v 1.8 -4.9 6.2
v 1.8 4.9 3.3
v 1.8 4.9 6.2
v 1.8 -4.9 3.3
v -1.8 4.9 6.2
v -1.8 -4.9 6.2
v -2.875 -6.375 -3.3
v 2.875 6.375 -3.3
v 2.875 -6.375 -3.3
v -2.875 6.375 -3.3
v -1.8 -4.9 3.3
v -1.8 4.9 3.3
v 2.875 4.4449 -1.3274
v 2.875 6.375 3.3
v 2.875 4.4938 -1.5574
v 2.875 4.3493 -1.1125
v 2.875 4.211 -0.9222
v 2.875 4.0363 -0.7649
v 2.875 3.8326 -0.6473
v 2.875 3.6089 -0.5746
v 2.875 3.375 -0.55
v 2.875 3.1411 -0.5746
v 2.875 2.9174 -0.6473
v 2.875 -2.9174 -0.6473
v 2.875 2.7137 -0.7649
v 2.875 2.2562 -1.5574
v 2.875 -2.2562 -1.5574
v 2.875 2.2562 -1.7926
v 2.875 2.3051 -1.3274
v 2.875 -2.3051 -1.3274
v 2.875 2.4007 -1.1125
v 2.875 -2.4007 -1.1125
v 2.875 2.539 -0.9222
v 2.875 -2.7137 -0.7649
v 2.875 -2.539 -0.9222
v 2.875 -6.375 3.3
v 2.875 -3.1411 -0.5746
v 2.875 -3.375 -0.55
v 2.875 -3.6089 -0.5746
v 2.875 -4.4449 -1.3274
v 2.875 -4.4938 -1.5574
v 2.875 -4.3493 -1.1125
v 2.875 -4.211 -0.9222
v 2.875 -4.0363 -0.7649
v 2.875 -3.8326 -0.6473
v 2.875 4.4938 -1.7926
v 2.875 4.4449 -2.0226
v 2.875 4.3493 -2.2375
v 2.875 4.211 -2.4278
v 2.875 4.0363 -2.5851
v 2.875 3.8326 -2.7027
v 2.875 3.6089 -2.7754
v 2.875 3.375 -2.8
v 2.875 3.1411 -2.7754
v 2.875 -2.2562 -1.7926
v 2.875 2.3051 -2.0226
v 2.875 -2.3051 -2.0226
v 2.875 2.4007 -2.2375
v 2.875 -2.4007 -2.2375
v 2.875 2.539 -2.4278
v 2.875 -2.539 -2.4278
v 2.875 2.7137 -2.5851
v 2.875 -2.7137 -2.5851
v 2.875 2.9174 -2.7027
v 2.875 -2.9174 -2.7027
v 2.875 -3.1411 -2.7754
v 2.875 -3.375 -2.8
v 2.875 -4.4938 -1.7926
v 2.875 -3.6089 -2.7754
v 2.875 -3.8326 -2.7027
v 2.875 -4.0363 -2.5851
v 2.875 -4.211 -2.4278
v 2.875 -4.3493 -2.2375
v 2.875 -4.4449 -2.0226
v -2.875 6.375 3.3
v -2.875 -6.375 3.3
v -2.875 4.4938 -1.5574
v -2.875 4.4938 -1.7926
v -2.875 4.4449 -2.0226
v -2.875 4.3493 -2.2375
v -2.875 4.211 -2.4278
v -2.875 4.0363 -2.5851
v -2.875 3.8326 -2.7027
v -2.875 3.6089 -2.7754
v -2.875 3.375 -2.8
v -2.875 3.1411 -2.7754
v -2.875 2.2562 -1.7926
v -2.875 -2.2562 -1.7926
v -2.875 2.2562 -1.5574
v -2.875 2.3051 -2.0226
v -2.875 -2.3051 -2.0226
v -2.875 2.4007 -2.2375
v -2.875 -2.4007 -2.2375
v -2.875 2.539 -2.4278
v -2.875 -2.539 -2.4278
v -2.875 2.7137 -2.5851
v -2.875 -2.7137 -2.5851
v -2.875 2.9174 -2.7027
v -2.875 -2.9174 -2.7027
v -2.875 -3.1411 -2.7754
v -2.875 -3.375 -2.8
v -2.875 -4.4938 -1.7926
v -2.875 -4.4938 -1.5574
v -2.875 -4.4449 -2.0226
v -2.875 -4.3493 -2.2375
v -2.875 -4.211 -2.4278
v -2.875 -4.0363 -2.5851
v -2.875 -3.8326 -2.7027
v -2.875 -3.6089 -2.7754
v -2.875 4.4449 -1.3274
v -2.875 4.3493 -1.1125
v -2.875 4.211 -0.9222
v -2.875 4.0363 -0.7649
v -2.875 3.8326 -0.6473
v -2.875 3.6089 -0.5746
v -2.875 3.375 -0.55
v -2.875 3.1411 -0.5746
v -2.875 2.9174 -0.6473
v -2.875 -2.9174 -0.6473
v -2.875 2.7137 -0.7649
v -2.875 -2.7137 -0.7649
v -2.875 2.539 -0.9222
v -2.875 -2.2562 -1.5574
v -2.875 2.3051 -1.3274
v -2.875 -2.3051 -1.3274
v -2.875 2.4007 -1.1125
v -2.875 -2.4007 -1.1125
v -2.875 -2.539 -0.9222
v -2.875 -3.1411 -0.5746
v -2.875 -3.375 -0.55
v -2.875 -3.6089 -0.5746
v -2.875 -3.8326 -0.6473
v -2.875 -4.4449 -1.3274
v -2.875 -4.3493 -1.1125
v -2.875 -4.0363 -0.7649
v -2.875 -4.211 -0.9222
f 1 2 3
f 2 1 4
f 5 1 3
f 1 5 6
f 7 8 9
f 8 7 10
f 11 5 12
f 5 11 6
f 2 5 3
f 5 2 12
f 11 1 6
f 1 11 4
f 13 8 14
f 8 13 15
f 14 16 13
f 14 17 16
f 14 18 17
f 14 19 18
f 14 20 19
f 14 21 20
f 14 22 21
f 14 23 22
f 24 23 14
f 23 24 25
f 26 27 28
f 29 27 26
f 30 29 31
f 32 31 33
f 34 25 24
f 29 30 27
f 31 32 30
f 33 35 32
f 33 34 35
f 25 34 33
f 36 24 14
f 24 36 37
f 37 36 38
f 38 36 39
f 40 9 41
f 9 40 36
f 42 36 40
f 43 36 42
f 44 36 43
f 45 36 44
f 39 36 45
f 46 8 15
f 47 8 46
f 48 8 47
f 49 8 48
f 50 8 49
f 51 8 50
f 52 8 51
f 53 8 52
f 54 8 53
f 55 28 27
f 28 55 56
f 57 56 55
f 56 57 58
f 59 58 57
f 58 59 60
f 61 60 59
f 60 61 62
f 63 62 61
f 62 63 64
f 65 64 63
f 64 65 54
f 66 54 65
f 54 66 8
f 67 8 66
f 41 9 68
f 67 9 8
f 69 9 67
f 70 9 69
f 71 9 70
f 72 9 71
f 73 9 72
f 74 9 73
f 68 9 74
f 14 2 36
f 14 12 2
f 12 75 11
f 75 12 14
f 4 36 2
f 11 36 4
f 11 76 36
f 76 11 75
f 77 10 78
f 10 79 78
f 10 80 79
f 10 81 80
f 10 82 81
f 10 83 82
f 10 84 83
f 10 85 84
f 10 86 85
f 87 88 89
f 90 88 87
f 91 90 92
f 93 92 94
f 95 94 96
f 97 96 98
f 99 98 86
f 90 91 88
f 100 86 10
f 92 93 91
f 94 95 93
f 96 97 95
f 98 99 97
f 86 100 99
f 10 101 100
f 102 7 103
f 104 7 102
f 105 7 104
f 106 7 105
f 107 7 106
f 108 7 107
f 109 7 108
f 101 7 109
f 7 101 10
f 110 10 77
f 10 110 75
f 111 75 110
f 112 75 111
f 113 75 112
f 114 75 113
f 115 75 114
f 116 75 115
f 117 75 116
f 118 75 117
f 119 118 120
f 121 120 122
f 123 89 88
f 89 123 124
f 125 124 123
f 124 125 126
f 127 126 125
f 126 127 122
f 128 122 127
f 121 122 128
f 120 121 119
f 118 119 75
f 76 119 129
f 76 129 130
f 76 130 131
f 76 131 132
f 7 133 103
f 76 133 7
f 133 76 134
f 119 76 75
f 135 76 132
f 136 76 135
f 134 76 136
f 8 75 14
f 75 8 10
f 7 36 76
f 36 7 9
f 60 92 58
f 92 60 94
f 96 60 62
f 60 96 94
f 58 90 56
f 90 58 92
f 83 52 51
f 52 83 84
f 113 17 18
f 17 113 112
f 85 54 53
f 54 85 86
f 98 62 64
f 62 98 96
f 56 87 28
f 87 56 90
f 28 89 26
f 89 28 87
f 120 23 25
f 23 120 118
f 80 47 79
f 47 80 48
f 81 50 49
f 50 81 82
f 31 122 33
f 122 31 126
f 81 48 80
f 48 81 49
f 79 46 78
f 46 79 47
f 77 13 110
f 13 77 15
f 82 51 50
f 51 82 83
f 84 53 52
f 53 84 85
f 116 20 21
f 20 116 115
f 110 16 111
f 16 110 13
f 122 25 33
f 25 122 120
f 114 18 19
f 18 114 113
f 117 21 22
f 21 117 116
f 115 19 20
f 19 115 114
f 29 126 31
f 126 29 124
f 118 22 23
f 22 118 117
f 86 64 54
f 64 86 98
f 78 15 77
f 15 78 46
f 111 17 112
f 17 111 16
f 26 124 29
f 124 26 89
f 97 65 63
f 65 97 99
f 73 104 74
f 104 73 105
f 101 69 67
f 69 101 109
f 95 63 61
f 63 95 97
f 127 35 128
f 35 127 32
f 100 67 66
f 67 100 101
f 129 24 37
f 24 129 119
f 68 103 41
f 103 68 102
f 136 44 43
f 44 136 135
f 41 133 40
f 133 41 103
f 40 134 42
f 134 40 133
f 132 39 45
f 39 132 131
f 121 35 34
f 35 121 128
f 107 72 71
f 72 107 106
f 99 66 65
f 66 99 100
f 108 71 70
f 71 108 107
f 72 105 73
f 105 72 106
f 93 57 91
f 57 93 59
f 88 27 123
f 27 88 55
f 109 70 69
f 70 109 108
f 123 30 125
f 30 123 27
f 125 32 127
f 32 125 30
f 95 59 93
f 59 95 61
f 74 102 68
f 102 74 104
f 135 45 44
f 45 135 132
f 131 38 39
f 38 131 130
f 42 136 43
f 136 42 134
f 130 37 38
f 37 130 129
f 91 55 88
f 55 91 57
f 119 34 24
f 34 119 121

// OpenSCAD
// file: ../settings.scad
// Common settings used by all scad files.

// ALL UNITS IN MILLIMETERS (MM)!!!

$fn = 30;//low-res but fast to render
//$fn = 50;//higher-res but slow to render

pi = 3.1415926535897932384626433832795;

max_footprint = 150; // 15x15 cm

bottom_clearance = 10;
bottom_clearance = 25.4/2+10;
//bottom_clearance = 30;

shell_alpha = 0.215;
//shell_alpha = 1.0;

tolerance = 0.5;

// Flat countersunk M2.5mm x 0.45mm machine screw.
screw_thread_diameter = 2.5;//2.8;//2.75;//2.4?
screw_thread_length = 5;//?
screw_head_diameter = 4.75; // M2.5
//screw_head_diameter = 5.2; // M3
screw_head_height = 1.5;//2;

screw_thread_diameter2 = 2;

unit_thickness = 5;
u = unit_thickness;

shell_thickness = unit_thickness;

// Show flags.
show_platform = 0;
show_head = 1;
show_head_shell = 0;
show_head_electronics_bb = 0;
show_battery = 1;
show_foot_cube = 0;
show_torso = 0;
show_motor = 0;
show_motor_plates = 1;
show_motor_inner_plates = 1;
show_motor_outer_plates = 1;
show_wheel = 0;//obsolete
show_tracks = 1;//
show_track_wheels = 1;
show_caster = 0;
show_rpi = 1;
show_vertical_plates = 1;//
show_horizontal_plates = 1;//
show_caster_plates = 0;//obsolete?
show_camera = 1;
show_screen = 0;
show_edge_mount = 1;
show_sonar_mount = 1;
show_recharge_mount = 1;
show_conduit = 1;
show_torso_shell = 1;
show_recharge_dock = 0;
show_head_tilt_axis = 0;
show_rpi_camera_axis = 0;
show_laser_axis = 0;

head_vertical_angle_tilt = 0;
//head_vertical_angle_tilt = 30;//max
//head_vertical_angle_tilt = 10;

torso_height = 120+20;

base_plate_diameter = max_footprint-unit_thickness*2;
base_plate_frame = 0;

head_height = 50;
head_offset_z = max_footprint/2;
head_middle_cutout = 85;

rpi_with_four_hats_and_clearance = 76;

qrd1114_w = 6.10;
qrd1114_l = 4.39;
qrd1114_h = 4.65;

dock_radius = 10;
dock_gripper_border = 2;
dock_gripper_instep = 0.9;
dock_gripper_cutout_tapper = 50;
dock_receiver_height = 5;

// Patriod Fuel+ 9000 mAh
battery_length = 90;
battery_width = 57;
battery_height = 23;
battery_offset_z = 30;//4;

wheel_diameter = 50;
wheel_offset_x = 65;
wheel_offset_z = wheel_diameter/2;
wheel_axle_diameter = 5;

//caster_diameter = 19.05; // 0.75 inches
caster_diameter = 25.45; // 1 inches
//caster_diameter = 15.875; // 5/8 inches
caster_holder_diameter = 30;//31;
caster_offset_y = base_plate_diameter/2 - caster_holder_diameter/2;

arduino_offset_x = 0;
arduino_offset_y = 0;
arduino_offset_z = 67;
arduino_offset_x2 = 0;
arduino_offset_y2 = -20;
arduino_offset_z2 = torso_height+bottom_clearance;

horizontal_plate_width = unit_thickness*8*2 - unit_thickness*2;
horizontal_plate_depth = unit_thickness*8*2;

vertical_plate_width = horizontal_plate_depth;
vertical_plate_height = unit_thickness*8;
vertical_plate_offset_x = wheel_offset_x-22.5;
vertical_plate_offset_z = vertical_plate_height/2 + unit_thickness/2;

vertical_battery_plate_height = 100 - 15;

caster_plate_width = horizontal_plate_width + unit_thickness*2;
caster_plate_mount_length = unit_thickness*4;
caster_plate_width_minor = caster_holder_diameter;

motor_switch_length = 20;
motor_switch_thickness = 6.5;
motor_switch_height = 11;
motor_switch_height_leads = 23;
motor_switch_on_height =  13.3;
motor_switch_hole_diameter = 2.5;
motor_switch_hole_offset_z = 6.5;//this plus diameter/2 is hole center from switch top
motor_switch_hole_spacing = 7.1;// holes are diameter/2 from this

motor_length = 60;
motor_width = 25;
motor_collar_width = 7;
motor_collar_height = 2.5;
motor_axle_width = 4;
motor_axle_height = 9.5;
motor_offset_x = 10;
//motor_offset_y = motor_width/2+5;
motor_offset_y = unit_thickness*3.5;
motor_offset_z = vertical_plate_height/2 - unit_thickness/2;//4;//30;
motor_mount_holes_dist = 17;
// motor countersink hole
motor_mount_holes_width = 3; // M3
motor_mount_holes_head_height = 2.2;
motor_mount_holes_head_width = 5.8;
motor_bearing_outer_diameter = 10;
motor_bearing_inner_diameter = 5.95;
motor_bearing_thickness = 2.5;

motor_unimount_idler_axle_d = screw_thread_diameter;
//motor_unimount_spacer_depth = 0.1;//too small
motor_unimount_spacer_depth = 0.5;

motor_arm_offset_y = -u*3;
motor_arm_offset_z = u*.5;

motor_plate_width = vertical_plate_width;
motor_plate_height = vertical_plate_height;
motor_plate_thickness = unit_thickness;
motor_plate_offset_z = vertical_plate_offset_z;

motor_plate_middle_thickness = 5;

wheel_hub_offset = u*3;

motor_hole_height_offset = -5;

nylon_spacer_outer_diameter = 6.35;
nylon_spacer_inner_diameter = 3.302;
nylon_spacer_length = 12.7;

track_width = unit_thickness*3;
track_offset_x = -50;
track_offset_z = .1;
//track_wheel_radius = 19;//original
track_wheel_radius = 14;
//track_wheel_hole_radius = (nylon_spacer_outer_diameter+1)/2;
track_wheel_hole_radius = motor_bearing_outer_diameter/2;

track_driver_hole_radius = (motor_axle_width)/2 + 0.1;
track_driver_set_screw_head_d = 4.1;
track_driver_set_screw_shaft_d = 2.4;
//track_wheel_width = 13.5;//original
track_wheel_width = u*2;
track_wheel_width_buffer = u*0.25;
track_offset = 3;        //distance from chassis
track_wheel_offset = track_offset;
//track_length = 250; // see tread_triangle.py, too big
//track_length = 240; // see tread_triangle.py
//track_length = 238; //inc/dec in 10 unit increments so notches match idlers
track_length = 228; //inc/dec in 10 unit increments so notches match idlers
track_radius = track_length/2/pi;
track_wheel_show_fancy = 1;
track_wheel_gap = track_wheel_width + track_wheel_width_buffer*2;
track_axle_bearing_diameter = motor_bearing_inner_diameter - 0.1;
track_tensioner_radius = 12;
track_nut_height = 3.5; //TODO
track_punchout_thickness = 0.25;//should be the same as the minimum layer thickness

head_slew_bearing_outer_diameter = 115;
head_slew_bearing_ring_thickness = 20;
head_slew_bearing_inner_diameter = head_slew_bearing_outer_diameter - head_slew_bearing_ring_thickness;
//head_slew_bearing_hole_diameter = head_slew_bearing_inner_diameter - head_slew_bearing_ring_thickness;
head_slew_bearing_hole_diameter = 12+tolerance; // slip ring https://www.adafruit.com/products/775
//head_slew_bearing_ball_diameter = 5;
head_slew_bearing_ball_diameter = 2.5; //u/2;
head_slew_bearing_height = u;//head_slew_bearing_ball_diameter*2;
head_slew_bearing_gap = 0.5;
head_slew_bearing_slew_gap = 0;
head_slew_bearing_gap_factor = 0.1;

neck_strut_width = u*7;
neck_strut_height = u*18;
neck_strut_spacing = u*8;

show_outer_race = 0;
show_inner_race_a = 1;
show_inner_race_b = 1;
show_balls = 0;
// main file
include <../settings.scad>;

module make_switch_d2f_01l83(){

    difference(){
        union(){
            color("blue")
            translate([0,0,(9.5-6.6)/2])
            cube([3.6, 9.8, 9.5], center=true);
            cube([5.75, 12.75, 6.6], center=true);
        }
        
        color("red")
        translate([0, 4.5/2+2.25/2, -6.6/2+2.25/2+0.5])
        rotate([0,90,0])
        cylinder(d=2.25, h=10, center=true);
        
        color("red")
        translate([0, -(4.5/2+2.25/2), -6.6/2+2.25/2+0.5])
        rotate([0,90,0])
        cylinder(d=2.25, h=10, center=true);
    }

}

make_switch_d2f_01l83();
